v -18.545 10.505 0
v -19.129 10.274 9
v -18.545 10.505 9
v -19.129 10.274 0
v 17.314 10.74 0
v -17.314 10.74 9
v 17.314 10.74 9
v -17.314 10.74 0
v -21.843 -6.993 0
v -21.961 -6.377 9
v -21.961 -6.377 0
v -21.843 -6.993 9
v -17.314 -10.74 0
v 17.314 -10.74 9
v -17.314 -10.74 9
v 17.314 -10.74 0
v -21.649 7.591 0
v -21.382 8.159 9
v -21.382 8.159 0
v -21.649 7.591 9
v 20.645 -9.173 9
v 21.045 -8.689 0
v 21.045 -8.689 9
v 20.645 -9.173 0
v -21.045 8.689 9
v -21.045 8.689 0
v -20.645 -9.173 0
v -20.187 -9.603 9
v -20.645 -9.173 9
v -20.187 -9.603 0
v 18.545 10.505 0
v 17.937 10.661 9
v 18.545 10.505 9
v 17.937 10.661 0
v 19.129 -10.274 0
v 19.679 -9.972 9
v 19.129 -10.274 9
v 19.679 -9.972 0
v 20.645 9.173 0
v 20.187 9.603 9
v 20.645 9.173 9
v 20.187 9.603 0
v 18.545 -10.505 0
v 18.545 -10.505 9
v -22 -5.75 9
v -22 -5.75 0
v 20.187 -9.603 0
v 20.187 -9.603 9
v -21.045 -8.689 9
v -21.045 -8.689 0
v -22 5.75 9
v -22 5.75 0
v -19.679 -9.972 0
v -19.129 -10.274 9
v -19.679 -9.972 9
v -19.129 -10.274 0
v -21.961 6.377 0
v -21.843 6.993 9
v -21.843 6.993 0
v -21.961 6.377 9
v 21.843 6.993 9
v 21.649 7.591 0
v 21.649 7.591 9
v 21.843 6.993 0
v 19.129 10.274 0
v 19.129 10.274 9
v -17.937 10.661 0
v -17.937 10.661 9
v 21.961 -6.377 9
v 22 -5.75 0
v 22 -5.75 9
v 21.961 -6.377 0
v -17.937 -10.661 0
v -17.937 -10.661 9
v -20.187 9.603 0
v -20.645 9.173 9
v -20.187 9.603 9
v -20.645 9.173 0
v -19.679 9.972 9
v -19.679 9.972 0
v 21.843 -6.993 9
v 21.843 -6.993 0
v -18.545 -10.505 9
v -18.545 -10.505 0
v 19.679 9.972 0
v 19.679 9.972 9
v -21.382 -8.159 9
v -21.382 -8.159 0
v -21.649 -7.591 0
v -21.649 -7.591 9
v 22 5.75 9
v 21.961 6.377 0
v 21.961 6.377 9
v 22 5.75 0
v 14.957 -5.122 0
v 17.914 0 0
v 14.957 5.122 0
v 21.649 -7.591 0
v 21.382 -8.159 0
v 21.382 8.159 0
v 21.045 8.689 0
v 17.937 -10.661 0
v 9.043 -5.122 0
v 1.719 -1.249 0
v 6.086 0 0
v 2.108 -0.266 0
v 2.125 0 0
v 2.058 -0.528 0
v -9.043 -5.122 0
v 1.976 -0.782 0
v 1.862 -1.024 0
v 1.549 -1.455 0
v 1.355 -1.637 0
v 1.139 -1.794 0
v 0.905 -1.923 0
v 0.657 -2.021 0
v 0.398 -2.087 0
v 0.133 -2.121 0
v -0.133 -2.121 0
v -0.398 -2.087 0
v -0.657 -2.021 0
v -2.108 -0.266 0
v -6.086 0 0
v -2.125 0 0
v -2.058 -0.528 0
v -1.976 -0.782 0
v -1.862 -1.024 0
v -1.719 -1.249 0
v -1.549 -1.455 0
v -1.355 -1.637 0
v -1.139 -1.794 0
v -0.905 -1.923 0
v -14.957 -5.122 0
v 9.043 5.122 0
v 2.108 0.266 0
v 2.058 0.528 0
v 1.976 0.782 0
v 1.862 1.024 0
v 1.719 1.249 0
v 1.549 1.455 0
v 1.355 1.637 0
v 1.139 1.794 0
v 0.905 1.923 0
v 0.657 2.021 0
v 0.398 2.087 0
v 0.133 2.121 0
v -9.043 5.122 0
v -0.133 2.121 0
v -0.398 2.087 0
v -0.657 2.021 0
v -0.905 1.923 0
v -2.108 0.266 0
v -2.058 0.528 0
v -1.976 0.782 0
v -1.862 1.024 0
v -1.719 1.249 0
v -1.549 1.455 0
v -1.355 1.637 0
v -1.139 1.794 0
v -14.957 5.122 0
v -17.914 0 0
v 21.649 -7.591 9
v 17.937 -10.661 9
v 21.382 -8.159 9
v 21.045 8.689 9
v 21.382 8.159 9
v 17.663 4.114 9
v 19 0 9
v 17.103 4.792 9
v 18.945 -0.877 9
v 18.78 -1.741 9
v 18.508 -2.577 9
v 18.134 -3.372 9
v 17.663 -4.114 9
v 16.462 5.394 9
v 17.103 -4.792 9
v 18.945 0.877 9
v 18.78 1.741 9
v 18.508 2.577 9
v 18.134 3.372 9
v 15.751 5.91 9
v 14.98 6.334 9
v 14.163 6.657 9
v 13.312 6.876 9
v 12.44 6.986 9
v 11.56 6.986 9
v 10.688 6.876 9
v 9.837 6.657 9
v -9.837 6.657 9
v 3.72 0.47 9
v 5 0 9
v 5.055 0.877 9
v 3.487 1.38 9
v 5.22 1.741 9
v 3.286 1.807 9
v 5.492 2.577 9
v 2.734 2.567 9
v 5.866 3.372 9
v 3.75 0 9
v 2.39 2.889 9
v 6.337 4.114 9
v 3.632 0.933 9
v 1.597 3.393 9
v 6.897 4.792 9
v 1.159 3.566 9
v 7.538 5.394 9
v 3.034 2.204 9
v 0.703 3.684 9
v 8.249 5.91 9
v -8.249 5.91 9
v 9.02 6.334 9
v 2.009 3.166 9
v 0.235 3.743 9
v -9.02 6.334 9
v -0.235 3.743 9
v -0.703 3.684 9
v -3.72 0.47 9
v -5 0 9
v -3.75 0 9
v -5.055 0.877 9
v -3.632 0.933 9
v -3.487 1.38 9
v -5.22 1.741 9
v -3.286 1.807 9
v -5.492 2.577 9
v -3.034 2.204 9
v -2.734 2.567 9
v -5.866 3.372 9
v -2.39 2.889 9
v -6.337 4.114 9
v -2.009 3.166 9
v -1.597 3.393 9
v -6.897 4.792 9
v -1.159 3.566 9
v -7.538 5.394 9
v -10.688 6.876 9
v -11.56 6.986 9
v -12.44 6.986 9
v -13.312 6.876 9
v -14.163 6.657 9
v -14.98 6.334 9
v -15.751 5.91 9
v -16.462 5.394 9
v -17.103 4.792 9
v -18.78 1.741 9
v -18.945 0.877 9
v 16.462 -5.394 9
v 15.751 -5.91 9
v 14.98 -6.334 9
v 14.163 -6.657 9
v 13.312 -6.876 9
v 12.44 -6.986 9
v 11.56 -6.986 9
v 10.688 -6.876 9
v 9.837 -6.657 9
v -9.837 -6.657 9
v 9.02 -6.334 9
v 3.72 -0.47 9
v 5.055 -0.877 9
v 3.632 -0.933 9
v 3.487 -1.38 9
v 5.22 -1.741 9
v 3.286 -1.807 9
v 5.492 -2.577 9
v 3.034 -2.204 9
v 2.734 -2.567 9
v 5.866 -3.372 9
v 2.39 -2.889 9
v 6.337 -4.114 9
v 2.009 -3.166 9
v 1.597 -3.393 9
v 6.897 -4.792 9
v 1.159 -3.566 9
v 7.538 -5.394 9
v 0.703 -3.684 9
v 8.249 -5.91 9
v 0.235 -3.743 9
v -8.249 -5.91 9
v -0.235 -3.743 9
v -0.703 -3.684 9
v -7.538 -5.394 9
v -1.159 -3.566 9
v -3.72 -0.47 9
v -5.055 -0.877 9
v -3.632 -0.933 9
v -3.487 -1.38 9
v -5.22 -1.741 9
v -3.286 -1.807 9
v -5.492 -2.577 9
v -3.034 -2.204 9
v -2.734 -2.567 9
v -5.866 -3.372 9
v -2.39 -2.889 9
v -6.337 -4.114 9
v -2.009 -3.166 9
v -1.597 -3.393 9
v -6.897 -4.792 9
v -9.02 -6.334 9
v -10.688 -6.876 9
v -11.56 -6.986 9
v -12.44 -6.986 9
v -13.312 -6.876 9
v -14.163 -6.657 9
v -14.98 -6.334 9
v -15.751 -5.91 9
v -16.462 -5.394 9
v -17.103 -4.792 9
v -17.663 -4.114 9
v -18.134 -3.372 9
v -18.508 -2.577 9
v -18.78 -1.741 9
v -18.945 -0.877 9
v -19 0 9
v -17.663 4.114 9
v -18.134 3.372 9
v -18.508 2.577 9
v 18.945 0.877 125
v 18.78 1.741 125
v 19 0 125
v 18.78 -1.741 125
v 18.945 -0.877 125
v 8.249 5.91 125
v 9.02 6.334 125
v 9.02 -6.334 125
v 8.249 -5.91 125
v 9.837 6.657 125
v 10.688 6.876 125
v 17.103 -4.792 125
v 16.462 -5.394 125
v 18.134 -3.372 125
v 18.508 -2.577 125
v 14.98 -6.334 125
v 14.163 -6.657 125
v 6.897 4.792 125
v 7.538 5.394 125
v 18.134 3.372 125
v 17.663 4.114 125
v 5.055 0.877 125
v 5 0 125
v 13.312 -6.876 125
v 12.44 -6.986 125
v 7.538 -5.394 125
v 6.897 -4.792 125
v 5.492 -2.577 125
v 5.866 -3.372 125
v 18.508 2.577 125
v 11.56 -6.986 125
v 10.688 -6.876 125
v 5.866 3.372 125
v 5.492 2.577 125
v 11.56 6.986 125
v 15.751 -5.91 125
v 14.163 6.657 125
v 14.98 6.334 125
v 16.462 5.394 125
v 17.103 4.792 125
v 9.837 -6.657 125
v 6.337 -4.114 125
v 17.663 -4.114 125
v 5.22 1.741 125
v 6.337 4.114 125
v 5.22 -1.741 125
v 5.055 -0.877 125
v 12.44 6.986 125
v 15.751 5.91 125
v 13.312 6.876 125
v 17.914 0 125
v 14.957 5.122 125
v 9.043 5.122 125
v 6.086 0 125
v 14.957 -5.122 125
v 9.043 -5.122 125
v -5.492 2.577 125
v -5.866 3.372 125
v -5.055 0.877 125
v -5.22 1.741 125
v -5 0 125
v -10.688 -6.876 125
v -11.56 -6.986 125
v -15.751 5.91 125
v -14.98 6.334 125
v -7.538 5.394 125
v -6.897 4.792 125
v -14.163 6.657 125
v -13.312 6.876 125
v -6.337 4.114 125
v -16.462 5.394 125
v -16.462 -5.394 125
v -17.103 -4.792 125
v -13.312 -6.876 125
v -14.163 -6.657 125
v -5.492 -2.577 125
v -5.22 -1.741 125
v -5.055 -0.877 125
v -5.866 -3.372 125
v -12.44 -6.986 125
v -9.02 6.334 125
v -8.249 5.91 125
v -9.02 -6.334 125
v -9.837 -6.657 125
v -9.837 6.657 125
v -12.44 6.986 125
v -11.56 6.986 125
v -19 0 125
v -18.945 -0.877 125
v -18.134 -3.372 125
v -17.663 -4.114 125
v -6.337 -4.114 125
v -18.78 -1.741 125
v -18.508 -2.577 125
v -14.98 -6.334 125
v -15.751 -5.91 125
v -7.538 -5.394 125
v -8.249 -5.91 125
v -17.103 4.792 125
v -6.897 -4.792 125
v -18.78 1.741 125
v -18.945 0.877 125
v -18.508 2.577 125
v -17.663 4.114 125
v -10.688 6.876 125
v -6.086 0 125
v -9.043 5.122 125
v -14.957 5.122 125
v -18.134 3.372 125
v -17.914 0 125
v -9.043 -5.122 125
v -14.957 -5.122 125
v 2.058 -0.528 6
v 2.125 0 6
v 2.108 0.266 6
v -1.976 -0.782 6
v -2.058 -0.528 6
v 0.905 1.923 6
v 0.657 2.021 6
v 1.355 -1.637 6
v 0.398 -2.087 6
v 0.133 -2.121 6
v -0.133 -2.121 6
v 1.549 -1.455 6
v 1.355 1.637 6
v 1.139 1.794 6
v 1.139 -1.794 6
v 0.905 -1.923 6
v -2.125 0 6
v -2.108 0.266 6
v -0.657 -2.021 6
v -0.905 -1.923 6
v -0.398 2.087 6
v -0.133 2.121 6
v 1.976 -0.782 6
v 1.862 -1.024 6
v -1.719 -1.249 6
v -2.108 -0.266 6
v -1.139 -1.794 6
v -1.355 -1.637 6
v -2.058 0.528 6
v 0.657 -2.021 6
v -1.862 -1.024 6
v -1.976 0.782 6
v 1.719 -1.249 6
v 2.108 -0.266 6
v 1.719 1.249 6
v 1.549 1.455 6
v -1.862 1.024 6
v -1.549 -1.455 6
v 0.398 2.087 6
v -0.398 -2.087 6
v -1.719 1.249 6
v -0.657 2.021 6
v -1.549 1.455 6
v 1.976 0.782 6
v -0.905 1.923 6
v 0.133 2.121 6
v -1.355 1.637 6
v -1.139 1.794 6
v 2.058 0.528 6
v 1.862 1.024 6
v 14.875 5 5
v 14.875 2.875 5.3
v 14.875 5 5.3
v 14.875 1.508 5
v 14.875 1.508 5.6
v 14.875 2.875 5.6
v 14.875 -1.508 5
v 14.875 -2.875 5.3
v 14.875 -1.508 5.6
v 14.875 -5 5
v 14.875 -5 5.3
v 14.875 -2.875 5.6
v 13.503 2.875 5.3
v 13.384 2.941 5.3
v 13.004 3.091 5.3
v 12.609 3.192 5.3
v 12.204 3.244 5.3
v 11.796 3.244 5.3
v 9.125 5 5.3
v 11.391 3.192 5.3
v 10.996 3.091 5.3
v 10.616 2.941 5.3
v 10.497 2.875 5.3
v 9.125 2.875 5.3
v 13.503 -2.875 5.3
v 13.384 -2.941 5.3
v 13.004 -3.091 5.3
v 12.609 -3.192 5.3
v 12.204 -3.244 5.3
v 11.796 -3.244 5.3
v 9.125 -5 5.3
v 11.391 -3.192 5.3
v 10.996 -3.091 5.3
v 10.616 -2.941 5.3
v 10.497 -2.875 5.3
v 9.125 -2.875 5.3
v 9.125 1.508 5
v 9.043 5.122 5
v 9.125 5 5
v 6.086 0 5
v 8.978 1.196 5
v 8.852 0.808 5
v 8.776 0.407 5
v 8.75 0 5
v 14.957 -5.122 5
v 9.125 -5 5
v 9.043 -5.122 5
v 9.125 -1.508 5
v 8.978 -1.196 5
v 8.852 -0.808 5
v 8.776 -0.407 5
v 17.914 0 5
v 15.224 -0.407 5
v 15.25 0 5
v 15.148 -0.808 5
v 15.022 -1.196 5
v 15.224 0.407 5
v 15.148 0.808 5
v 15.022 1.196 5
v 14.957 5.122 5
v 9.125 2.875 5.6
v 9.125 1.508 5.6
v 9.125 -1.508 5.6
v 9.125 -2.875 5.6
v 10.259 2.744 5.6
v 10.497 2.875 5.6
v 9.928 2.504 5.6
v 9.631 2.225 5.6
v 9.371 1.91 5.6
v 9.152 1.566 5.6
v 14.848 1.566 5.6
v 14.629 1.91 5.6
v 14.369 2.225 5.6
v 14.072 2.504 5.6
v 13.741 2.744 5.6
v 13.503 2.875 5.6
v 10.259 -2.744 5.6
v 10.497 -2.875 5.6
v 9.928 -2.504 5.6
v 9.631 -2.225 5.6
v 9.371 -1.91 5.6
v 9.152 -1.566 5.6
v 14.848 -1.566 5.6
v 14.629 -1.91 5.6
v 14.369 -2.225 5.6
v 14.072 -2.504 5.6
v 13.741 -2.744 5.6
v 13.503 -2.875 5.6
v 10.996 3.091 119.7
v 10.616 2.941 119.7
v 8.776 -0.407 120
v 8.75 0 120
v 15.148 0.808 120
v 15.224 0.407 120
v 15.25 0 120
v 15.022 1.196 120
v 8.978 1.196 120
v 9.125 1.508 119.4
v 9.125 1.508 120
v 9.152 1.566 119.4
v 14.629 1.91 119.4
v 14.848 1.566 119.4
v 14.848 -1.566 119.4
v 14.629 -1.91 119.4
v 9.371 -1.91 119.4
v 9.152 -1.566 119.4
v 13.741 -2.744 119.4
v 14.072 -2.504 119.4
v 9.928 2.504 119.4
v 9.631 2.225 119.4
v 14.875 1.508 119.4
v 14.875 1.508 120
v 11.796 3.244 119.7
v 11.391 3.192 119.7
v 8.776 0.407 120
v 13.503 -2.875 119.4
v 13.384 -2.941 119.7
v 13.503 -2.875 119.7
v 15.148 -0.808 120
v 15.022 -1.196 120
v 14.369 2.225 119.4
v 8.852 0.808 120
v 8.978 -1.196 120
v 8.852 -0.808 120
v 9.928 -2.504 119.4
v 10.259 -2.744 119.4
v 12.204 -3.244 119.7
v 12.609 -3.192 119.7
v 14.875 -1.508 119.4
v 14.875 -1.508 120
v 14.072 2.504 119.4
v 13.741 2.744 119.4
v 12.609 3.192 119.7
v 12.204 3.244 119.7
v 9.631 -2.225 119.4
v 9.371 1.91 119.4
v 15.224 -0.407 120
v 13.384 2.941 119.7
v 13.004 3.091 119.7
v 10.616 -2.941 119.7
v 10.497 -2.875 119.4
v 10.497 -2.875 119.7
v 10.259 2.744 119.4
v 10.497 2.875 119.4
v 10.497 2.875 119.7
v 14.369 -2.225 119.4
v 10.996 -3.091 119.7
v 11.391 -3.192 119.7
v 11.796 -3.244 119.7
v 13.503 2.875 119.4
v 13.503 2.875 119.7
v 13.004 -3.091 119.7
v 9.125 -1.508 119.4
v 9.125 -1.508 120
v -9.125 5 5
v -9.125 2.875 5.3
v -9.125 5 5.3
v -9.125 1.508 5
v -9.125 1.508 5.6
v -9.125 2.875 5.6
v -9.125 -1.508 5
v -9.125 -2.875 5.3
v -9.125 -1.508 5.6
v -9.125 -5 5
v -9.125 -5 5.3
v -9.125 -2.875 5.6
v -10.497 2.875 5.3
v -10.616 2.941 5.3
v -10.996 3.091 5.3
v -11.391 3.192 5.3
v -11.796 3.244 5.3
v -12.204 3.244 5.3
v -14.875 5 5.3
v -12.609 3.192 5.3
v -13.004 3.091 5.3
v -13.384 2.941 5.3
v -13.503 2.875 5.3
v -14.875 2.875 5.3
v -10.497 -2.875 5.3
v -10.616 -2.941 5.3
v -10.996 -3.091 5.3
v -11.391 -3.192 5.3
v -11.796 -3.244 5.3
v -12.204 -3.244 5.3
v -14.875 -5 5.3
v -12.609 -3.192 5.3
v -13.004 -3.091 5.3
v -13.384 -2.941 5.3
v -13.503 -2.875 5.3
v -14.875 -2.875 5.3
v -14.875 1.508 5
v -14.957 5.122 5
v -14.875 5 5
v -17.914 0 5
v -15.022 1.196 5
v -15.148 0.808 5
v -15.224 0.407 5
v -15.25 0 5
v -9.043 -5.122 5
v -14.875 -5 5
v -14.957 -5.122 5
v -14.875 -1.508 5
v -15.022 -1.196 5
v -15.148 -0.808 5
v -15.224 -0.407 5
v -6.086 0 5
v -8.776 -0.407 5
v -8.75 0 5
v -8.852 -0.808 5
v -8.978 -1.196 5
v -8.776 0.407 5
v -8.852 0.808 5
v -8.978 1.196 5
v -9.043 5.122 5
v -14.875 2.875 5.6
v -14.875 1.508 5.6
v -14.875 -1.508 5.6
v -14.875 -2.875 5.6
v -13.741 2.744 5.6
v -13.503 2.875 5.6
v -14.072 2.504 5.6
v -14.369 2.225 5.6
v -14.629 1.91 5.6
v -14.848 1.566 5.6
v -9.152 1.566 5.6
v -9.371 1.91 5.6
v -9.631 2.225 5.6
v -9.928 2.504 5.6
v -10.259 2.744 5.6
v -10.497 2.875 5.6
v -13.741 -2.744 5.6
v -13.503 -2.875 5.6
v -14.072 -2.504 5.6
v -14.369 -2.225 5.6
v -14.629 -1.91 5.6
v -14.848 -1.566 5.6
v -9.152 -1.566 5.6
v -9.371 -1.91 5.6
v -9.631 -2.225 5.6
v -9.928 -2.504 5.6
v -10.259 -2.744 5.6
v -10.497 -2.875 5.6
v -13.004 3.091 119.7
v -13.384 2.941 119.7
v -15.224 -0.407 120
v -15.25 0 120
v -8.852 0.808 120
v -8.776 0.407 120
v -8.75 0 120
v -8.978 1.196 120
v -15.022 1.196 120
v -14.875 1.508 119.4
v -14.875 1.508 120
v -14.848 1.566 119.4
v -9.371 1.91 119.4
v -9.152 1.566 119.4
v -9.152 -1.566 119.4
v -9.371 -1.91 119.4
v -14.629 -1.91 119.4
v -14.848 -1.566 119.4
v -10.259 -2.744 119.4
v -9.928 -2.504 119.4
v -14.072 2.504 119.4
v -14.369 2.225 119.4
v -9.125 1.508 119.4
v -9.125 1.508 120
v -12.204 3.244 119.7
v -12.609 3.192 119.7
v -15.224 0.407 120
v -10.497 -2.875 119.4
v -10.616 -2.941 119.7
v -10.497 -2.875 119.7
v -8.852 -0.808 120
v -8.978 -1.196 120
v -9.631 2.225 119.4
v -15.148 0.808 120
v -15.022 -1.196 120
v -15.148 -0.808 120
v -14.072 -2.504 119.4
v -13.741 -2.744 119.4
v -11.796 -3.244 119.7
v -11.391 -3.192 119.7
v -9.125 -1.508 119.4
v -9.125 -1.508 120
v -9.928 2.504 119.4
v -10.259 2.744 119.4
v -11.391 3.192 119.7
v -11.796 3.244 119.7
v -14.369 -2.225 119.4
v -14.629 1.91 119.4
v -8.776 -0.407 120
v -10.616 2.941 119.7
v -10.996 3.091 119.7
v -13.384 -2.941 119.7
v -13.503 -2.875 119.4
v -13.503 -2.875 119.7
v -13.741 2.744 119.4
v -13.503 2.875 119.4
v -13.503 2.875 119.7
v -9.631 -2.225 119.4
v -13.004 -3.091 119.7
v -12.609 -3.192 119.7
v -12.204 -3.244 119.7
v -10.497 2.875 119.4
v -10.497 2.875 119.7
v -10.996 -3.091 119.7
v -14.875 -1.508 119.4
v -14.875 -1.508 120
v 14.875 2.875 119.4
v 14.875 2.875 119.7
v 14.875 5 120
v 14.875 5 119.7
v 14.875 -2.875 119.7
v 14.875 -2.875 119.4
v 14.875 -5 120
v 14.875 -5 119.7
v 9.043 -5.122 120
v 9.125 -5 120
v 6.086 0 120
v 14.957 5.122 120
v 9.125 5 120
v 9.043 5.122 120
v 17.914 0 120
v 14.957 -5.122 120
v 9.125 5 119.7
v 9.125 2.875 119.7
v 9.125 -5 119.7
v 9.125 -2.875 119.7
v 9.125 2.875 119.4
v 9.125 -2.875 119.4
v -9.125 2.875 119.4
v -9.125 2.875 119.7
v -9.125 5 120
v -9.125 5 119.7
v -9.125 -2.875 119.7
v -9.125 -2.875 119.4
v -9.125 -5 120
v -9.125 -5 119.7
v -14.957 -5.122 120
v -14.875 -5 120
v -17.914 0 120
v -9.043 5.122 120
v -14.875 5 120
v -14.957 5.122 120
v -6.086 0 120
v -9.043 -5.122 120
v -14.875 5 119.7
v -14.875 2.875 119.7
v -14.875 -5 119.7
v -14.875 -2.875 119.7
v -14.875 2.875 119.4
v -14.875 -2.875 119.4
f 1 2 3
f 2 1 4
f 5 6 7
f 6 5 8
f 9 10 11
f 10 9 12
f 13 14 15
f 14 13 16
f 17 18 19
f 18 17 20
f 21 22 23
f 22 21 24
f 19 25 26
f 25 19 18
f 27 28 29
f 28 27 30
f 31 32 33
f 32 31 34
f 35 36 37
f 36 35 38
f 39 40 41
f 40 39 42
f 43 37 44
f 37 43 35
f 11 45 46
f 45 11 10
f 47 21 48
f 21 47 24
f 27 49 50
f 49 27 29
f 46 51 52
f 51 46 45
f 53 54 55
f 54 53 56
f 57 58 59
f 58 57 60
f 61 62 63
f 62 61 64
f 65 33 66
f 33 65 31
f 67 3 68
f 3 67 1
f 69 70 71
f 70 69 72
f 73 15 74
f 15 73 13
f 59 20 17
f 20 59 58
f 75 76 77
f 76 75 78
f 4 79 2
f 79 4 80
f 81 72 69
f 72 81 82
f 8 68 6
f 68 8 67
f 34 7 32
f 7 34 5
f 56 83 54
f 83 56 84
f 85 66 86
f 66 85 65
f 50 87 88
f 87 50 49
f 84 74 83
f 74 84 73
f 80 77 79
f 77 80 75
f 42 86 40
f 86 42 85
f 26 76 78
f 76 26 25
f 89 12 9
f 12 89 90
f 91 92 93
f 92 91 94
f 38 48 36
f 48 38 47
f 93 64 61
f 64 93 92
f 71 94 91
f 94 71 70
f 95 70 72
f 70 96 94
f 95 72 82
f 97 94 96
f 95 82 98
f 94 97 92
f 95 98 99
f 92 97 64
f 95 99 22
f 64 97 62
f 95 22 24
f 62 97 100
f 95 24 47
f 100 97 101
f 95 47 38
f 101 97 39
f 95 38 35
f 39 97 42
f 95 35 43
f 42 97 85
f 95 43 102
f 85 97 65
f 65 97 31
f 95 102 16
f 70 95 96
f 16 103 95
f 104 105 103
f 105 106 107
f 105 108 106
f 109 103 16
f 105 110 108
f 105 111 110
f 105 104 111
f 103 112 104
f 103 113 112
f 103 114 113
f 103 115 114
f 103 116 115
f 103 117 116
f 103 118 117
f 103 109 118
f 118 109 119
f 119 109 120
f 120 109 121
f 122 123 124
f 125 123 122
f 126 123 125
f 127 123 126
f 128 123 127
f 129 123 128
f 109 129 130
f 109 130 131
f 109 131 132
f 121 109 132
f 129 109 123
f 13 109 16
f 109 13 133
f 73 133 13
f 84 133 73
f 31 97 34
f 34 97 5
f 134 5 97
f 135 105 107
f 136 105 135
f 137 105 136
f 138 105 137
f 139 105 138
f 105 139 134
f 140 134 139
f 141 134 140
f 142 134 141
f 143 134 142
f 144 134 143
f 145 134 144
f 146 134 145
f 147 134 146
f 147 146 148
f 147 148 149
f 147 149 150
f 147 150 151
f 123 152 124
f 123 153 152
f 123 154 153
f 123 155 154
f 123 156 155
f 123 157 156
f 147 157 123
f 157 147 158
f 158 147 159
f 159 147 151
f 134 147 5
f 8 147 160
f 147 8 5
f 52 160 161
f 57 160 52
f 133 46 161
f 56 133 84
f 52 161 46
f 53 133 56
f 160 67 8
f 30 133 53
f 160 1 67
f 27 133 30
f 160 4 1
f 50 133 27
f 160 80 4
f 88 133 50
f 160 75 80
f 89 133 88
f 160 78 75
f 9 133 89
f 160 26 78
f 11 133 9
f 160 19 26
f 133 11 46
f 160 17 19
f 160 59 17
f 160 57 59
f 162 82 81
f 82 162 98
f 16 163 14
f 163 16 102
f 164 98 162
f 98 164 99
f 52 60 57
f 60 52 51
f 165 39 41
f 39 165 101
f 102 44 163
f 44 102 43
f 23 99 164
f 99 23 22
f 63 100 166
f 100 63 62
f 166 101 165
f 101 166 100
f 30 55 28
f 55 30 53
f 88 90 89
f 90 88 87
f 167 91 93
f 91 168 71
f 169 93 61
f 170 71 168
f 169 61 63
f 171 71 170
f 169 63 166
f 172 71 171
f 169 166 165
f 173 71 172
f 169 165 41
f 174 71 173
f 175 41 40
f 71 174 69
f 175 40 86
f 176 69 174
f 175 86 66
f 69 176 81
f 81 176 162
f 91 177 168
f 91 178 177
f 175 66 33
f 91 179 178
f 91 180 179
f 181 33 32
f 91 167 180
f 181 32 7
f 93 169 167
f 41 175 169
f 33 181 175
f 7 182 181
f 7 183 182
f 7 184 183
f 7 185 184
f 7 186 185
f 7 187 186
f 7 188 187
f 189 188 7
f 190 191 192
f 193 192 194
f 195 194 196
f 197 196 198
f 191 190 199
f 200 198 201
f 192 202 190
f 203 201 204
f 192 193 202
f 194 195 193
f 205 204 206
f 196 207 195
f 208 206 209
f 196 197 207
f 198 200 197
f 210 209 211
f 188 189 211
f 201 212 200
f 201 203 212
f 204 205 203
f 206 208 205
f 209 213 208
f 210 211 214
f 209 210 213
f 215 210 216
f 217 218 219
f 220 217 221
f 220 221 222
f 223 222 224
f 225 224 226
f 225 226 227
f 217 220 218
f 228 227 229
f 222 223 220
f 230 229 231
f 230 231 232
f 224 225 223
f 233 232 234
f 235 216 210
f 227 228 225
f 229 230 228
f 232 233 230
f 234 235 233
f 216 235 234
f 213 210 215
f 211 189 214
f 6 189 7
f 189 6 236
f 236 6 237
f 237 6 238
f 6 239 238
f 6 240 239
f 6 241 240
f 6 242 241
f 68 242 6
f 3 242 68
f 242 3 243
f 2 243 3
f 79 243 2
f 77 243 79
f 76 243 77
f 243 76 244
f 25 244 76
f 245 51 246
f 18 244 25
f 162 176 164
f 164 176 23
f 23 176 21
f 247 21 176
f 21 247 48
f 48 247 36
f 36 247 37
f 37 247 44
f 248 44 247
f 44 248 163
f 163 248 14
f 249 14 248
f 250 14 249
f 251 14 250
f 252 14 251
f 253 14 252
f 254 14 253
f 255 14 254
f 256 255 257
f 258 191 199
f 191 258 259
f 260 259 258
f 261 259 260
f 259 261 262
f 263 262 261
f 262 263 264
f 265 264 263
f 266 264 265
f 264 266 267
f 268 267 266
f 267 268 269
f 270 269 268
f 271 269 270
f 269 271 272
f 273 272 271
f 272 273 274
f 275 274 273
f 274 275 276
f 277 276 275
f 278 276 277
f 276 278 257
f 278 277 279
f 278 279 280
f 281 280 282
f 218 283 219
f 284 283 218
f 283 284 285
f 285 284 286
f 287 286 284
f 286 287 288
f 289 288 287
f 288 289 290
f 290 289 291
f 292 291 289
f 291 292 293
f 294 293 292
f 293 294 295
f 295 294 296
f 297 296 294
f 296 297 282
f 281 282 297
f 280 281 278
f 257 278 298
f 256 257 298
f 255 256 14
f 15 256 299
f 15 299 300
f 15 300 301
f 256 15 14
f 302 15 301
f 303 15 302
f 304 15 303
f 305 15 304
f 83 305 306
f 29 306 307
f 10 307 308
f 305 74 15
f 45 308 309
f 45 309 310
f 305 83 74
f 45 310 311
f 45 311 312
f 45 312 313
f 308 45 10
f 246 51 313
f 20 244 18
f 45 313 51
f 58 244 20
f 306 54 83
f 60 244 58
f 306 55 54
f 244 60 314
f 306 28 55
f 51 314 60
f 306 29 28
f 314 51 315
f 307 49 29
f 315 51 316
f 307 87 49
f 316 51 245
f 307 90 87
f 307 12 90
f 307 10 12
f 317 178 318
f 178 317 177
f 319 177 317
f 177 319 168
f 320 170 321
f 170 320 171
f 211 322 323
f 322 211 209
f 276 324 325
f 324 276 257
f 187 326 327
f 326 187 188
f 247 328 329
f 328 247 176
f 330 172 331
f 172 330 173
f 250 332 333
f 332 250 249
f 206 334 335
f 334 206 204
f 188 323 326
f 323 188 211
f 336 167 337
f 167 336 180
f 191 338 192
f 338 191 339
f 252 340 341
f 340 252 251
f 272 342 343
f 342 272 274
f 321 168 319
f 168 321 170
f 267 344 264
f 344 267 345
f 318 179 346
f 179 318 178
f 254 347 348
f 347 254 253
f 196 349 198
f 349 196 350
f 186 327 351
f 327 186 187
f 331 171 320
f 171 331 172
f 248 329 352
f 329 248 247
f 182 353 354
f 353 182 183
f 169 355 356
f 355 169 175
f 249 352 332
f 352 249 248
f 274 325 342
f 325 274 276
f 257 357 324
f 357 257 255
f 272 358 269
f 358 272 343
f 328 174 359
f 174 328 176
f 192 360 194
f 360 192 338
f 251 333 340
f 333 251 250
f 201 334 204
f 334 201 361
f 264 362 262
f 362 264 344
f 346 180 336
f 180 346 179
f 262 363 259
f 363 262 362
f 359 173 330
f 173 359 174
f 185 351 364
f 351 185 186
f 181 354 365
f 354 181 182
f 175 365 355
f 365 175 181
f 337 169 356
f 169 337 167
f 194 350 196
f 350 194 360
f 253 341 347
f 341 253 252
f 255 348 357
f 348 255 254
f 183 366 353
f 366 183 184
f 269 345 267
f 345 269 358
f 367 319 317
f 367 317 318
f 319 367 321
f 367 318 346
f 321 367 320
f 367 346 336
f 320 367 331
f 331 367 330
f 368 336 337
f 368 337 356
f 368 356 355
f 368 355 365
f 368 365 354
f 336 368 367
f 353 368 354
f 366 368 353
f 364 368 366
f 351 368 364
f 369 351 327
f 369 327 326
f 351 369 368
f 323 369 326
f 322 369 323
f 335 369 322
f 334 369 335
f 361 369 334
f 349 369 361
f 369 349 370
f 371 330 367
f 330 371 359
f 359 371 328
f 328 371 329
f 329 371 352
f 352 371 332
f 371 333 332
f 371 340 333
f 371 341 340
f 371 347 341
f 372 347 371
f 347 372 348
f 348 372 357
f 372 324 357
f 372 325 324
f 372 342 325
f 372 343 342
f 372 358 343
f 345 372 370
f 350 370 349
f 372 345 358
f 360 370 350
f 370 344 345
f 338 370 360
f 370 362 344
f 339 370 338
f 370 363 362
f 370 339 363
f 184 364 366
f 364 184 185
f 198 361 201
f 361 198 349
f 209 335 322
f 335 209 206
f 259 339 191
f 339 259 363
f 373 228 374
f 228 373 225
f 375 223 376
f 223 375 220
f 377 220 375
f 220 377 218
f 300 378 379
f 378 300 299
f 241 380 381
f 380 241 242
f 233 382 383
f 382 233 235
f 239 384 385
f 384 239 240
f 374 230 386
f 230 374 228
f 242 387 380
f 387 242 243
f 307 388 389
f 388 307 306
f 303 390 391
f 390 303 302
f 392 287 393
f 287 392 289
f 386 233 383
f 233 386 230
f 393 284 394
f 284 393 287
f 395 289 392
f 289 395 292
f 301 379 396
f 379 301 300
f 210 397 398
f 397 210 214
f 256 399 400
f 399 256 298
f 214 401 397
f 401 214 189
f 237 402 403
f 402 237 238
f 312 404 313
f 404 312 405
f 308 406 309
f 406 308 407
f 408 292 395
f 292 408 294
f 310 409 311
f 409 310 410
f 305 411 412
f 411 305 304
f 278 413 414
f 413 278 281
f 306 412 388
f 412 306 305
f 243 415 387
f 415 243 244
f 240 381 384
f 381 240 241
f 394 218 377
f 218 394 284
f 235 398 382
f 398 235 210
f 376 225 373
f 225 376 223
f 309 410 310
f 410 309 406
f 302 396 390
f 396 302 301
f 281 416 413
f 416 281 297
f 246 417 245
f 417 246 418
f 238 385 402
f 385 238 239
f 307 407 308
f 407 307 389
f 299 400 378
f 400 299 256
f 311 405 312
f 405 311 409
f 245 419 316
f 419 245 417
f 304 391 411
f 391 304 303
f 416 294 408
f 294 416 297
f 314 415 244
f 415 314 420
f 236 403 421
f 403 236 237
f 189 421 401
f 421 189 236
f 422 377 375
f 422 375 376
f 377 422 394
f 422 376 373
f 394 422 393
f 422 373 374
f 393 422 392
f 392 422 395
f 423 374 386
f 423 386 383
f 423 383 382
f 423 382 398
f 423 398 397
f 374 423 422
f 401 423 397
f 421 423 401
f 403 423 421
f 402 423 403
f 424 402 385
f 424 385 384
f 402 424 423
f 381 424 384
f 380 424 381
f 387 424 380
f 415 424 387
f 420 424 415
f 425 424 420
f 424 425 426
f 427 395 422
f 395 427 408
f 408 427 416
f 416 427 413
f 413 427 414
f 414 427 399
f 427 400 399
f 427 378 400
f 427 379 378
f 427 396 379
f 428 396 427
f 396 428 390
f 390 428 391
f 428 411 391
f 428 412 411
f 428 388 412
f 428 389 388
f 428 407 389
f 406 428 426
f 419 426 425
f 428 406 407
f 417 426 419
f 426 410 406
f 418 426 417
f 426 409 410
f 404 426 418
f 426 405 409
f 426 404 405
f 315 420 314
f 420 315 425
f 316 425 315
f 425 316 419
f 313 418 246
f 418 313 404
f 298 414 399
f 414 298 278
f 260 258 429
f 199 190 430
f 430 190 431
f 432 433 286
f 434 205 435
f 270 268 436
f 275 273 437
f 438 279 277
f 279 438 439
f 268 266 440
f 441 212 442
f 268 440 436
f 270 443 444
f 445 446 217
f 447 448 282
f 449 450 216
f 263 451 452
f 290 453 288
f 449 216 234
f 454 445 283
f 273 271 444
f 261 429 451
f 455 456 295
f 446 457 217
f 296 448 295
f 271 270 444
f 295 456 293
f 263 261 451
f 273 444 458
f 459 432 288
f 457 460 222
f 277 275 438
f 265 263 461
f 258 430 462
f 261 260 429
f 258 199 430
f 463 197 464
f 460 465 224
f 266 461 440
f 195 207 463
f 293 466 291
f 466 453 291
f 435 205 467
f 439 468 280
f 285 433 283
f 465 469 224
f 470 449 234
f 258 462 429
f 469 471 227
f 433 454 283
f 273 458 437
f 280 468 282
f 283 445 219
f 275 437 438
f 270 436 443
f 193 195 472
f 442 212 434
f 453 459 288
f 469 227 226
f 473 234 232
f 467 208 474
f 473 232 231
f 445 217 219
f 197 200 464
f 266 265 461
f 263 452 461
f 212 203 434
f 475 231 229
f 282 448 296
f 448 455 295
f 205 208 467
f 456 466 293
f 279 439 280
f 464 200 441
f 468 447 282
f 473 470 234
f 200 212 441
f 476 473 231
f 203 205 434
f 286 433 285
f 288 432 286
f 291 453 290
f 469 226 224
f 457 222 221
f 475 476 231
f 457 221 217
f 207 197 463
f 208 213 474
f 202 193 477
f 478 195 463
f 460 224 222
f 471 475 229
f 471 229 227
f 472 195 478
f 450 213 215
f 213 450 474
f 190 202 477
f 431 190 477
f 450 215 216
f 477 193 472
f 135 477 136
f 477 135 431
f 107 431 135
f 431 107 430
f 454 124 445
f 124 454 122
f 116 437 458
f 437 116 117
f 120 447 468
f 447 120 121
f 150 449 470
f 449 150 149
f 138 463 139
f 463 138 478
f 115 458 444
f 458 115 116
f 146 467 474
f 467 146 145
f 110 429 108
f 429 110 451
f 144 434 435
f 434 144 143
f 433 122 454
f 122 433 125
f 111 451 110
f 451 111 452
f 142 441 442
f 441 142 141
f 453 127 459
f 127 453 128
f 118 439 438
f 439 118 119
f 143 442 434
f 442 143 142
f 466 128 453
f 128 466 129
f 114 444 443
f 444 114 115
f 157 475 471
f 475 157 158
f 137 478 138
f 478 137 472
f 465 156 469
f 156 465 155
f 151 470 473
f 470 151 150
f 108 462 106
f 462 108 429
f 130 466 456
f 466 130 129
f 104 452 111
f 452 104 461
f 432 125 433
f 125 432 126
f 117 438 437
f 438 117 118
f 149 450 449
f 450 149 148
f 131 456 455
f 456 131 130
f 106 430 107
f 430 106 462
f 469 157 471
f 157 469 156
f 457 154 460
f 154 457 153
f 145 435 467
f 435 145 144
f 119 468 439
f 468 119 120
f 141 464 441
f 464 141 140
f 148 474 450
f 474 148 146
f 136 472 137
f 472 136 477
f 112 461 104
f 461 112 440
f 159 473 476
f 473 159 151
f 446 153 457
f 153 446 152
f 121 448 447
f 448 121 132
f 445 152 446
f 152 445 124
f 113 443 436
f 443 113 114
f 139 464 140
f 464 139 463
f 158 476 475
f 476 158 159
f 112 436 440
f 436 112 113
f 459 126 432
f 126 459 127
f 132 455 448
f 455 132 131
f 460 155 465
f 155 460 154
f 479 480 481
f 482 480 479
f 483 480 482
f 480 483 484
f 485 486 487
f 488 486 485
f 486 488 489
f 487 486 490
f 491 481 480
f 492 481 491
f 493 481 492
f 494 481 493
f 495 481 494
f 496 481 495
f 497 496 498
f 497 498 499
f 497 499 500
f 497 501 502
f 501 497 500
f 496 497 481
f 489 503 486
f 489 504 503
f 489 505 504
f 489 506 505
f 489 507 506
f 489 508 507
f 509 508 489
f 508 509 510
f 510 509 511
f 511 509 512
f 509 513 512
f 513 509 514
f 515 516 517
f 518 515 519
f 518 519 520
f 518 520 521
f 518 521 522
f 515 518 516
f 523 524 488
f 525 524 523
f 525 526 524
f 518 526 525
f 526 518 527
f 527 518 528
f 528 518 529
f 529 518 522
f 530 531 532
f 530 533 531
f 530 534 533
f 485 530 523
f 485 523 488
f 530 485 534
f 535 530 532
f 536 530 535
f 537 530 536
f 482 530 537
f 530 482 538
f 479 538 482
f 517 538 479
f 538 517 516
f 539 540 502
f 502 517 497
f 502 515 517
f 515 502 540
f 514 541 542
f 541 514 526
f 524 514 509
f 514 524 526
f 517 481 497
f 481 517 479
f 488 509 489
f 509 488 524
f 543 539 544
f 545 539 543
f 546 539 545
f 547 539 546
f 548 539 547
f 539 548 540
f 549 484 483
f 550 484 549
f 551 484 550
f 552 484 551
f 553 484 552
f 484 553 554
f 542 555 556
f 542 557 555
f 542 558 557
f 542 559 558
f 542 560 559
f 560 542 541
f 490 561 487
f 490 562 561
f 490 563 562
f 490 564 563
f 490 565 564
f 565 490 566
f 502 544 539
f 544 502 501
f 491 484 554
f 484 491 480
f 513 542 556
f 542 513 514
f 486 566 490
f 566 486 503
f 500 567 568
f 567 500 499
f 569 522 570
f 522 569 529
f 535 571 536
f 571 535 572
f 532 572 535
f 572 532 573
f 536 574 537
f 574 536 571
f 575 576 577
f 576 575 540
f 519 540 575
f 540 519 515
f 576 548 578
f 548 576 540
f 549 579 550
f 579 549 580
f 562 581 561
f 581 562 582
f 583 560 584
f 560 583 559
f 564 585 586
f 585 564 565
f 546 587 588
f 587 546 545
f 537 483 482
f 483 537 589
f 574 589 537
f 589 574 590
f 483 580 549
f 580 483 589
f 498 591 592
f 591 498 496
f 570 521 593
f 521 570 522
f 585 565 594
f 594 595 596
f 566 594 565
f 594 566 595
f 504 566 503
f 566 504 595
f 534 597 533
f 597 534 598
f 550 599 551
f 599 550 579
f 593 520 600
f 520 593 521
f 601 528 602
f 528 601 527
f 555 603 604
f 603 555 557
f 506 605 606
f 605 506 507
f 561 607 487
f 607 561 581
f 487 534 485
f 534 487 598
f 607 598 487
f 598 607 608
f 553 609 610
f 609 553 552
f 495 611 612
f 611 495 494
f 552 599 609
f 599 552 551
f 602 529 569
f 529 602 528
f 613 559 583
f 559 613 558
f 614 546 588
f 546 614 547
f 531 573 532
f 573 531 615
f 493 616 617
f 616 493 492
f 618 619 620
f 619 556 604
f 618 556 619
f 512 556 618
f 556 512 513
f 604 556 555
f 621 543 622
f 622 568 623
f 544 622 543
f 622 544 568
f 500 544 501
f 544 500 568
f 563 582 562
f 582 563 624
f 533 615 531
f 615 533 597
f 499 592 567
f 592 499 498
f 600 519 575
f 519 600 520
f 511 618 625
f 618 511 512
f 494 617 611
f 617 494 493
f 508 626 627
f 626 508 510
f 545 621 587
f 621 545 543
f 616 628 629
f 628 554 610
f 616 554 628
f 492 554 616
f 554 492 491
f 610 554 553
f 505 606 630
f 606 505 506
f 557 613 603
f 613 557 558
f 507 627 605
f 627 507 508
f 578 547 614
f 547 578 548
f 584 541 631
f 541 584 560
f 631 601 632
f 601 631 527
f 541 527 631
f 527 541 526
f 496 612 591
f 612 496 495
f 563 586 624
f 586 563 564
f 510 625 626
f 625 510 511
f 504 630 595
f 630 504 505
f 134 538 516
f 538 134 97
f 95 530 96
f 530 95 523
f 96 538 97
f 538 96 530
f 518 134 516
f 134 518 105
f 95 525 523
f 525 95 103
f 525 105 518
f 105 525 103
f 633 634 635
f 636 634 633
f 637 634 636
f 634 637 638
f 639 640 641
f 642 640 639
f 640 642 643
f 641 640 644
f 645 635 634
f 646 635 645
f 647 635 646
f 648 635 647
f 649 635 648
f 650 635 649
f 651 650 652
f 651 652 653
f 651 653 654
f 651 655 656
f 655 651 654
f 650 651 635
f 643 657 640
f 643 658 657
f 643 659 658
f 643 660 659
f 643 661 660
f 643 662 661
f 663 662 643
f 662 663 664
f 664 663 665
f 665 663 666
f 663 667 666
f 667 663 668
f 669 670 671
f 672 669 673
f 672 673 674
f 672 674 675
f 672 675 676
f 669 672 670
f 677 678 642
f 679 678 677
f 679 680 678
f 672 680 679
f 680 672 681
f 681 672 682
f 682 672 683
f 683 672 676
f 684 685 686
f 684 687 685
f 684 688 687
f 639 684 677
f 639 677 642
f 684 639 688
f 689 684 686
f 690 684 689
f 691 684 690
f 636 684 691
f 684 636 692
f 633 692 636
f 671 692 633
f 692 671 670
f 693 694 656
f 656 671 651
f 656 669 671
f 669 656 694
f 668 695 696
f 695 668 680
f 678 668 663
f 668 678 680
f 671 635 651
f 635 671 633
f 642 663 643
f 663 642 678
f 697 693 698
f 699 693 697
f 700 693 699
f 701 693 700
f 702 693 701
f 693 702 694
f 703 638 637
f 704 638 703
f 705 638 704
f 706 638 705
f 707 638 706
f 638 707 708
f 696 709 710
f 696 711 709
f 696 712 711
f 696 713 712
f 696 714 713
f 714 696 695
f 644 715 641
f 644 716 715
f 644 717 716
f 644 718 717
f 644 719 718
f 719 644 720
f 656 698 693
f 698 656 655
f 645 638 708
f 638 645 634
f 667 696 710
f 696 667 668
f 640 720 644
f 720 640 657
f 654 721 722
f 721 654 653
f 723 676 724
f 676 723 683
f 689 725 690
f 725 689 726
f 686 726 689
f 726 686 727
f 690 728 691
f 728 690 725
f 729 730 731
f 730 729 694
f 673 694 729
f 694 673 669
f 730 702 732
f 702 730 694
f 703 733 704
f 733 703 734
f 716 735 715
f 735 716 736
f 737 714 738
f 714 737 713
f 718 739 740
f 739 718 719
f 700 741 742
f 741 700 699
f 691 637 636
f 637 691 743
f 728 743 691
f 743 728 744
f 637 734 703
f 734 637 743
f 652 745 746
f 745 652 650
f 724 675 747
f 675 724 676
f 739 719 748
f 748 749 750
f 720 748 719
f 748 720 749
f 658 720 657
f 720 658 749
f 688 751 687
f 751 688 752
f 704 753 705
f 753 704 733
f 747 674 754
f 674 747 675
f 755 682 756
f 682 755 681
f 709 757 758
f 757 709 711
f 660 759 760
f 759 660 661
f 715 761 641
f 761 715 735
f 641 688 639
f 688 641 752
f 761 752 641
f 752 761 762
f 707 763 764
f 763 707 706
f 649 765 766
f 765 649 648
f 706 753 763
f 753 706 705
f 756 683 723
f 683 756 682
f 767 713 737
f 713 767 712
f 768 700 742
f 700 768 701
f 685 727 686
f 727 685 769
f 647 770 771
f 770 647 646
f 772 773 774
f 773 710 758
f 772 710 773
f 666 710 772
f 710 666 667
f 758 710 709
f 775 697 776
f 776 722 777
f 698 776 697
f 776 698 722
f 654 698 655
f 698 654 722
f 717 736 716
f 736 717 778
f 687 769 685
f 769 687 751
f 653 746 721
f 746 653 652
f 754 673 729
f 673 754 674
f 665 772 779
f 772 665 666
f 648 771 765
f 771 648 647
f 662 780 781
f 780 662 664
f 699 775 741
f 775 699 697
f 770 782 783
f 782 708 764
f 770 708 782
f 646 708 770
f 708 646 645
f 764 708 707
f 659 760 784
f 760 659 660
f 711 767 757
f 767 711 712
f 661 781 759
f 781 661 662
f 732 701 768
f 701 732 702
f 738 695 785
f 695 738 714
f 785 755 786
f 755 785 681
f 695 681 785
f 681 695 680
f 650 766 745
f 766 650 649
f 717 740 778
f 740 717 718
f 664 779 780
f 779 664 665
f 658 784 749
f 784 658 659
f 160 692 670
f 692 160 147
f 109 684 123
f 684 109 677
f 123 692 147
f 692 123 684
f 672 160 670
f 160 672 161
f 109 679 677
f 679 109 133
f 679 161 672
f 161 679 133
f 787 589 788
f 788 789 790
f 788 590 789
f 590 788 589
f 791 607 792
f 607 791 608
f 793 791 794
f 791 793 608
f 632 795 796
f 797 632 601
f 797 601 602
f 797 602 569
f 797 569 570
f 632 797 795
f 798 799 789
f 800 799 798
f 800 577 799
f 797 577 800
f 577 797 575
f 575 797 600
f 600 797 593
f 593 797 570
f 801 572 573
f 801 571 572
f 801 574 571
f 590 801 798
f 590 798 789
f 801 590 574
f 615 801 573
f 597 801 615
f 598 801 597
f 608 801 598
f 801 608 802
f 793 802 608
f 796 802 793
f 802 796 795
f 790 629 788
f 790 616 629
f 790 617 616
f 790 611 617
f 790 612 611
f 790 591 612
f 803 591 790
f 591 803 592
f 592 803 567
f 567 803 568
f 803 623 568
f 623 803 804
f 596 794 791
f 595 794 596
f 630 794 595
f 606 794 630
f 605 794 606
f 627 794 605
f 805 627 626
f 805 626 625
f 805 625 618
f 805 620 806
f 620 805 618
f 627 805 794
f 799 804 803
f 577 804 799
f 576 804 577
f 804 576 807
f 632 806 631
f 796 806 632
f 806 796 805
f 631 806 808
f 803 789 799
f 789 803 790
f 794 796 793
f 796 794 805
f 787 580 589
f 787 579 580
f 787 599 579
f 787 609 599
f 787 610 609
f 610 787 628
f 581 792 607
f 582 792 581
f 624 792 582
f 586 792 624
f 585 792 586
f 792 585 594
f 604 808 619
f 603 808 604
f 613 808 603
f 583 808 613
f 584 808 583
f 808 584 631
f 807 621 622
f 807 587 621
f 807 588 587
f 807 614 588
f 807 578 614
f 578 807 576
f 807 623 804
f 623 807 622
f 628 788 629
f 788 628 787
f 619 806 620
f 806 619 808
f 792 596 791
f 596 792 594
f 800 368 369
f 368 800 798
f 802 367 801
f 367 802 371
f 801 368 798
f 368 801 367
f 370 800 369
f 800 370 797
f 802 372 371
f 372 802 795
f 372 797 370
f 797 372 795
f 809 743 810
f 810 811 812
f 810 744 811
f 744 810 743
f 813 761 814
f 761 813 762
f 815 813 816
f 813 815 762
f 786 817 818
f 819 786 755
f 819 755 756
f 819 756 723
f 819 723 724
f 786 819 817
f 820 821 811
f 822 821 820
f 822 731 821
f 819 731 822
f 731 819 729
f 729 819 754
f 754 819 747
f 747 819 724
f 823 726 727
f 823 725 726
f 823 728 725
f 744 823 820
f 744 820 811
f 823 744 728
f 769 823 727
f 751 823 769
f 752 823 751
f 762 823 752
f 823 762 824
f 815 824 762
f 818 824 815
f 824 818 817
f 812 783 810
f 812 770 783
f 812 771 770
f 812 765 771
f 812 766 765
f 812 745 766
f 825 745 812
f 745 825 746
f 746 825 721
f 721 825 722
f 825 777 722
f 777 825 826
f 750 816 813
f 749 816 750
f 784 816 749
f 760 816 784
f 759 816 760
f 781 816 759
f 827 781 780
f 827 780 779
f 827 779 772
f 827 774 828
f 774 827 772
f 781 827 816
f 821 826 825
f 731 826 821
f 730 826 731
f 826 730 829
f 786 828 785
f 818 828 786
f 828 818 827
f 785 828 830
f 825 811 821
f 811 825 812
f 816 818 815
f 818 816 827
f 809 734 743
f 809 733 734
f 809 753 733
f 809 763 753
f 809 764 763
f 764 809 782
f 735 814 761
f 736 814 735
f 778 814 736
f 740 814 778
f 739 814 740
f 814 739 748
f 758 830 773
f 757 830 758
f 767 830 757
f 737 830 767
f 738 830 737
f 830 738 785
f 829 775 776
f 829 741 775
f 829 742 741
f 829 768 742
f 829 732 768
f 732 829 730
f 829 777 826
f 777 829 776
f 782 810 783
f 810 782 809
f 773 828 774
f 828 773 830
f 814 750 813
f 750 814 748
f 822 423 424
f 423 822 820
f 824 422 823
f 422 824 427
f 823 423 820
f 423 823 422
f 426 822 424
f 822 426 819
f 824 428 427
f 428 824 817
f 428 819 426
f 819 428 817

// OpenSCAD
$fn = 50;


difference() {
	union() {
		hull() {
			translate(v = [-17.0000000000, 5.7500000000, 0]) {
				cylinder(h = 9, r = 5);
			}
			translate(v = [17.0000000000, 5.7500000000, 0]) {
				cylinder(h = 9, r = 5);
			}
			translate(v = [-17.0000000000, -5.7500000000, 0]) {
				cylinder(h = 9, r = 5);
			}
			translate(v = [17.0000000000, -5.7500000000, 0]) {
				cylinder(h = 9, r = 5);
			}
		}
		translate(v = [12.0000000000, 0, 0.0000000000]) {
			cylinder(h = 125, r = 7.0000000000);
		}
		translate(v = [-12.0000000000, 0, 0.0000000000]) {
			cylinder(h = 125, r = 7.0000000000);
		}
	}
	union() {
		translate(v = [0, 0, 9]) {
			rotate(a = [0, 0, 0]) {
				difference() {
					union() {
						#translate(v = [0, 0, -120.0000000000]) {
							cylinder(h = 120, r = 2.0000000000);
						}
						#translate(v = [0, 0, -3]) {
							cylinder(h = 3, r1 = 2.1250000000, r2 = 3.7500000000);
						}
						#translate(v = [0, 0, -120.0000000000]) {
							cylinder(h = 120, r = 2.1250000000);
						}
						#translate(v = [0, 0, -120.0000000000]) {
							cylinder(h = 120, r = 2.0000000000);
						}
					}
					union();
				}
			}
		}
		translate(v = [12.0000000000, 0, 0]) {
			rotate(a = [0, 0, 0]) {
				difference() {
					union() {
						#translate(v = [-2.8750000000, -5.0000000000, -0.3000000000]) {
							cube(size = [5.7500000000, 10, 0.3000000000]);
						}
						#translate(v = [-2.8750000000, -2.8750000000, -0.6000000000]) {
							cube(size = [5.7500000000, 5.7500000000, 0.3000000000]);
						}
						#translate(v = [-2.8750000000, -5.0000000000, 5]) {
							cube(size = [5.7500000000, 10, 0.3000000000]);
						}
						#translate(v = [-2.8750000000, -2.8750000000, 5.3000000000]) {
							cube(size = [5.7500000000, 5.7500000000, 0.3000000000]);
						}
						#translate(v = [0, 0, -100.0000000000]) {
							cylinder(h = 200, r = 3.2500000000);
						}
						#linear_extrude(height = 5) {
							polygon(points = [[5.9142500000, 0.0000000000], [2.9571250000, 5.1218907443], [-2.9571250000, 5.1218907443], [-5.9142500000, 0.0000000000], [-2.9571250000, -5.1218907443], [2.9571250000, -5.1218907443]]);
						}
						#translate(v = [-2.8750000000, -5.0000000000, -0.3000000000]) {
							cube(size = [5.7500000000, 10, 0.3000000000]);
						}
						#translate(v = [-2.8750000000, -2.8750000000, -0.6000000000]) {
							cube(size = [5.7500000000, 5.7500000000, 0.3000000000]);
						}
						#translate(v = [-2.8750000000, -5.0000000000, 5]) {
							cube(size = [5.7500000000, 10, 0.3000000000]);
						}
						#translate(v = [-2.8750000000, -2.8750000000, 5.3000000000]) {
							cube(size = [5.7500000000, 5.7500000000, 0.3000000000]);
						}
						#translate(v = [0, 0, -100.0000000000]) {
							cylinder(h = 200, r = 3.2500000000);
						}
						#translate(v = [-2.8750000000, -5.0000000000, -0.3000000000]) {
							cube(size = [5.7500000000, 10, 0.3000000000]);
						}
						#translate(v = [-2.8750000000, -2.8750000000, -0.6000000000]) {
							cube(size = [5.7500000000, 5.7500000000, 0.3000000000]);
						}
						#translate(v = [-2.8750000000, -5.0000000000, 5]) {
							cube(size = [5.7500000000, 10, 0.3000000000]);
						}
						#translate(v = [-2.8750000000, -2.8750000000, 5.3000000000]) {
							cube(size = [5.7500000000, 5.7500000000, 0.3000000000]);
						}
						#translate(v = [0, 0, -100.0000000000]) {
							cylinder(h = 200, r = 3.2500000000);
						}
					}
					union();
				}
			}
		}
		translate(v = [-12.0000000000, 0, 0]) {
			rotate(a = [0, 0, 0]) {
				difference() {
					union() {
						#translate(v = [-2.8750000000, -5.0000000000, -0.3000000000]) {
							cube(size = [5.7500000000, 10, 0.3000000000]);
						}
						#translate(v = [-2.8750000000, -2.8750000000, -0.6000000000]) {
							cube(size = [5.7500000000, 5.7500000000, 0.3000000000]);
						}
						#translate(v = [-2.8750000000, -5.0000000000, 5]) {
							cube(size = [5.7500000000, 10, 0.3000000000]);
						}
						#translate(v = [-2.8750000000, -2.8750000000, 5.3000000000]) {
							cube(size = [5.7500000000, 5.7500000000, 0.3000000000]);
						}
						#translate(v = [0, 0, -100.0000000000]) {
							cylinder(h = 200, r = 3.2500000000);
						}
						#linear_extrude(height = 5) {
							polygon(points = [[5.9142500000, 0.0000000000], [2.9571250000, 5.1218907443], [-2.9571250000, 5.1218907443], [-5.9142500000, 0.0000000000], [-2.9571250000, -5.1218907443], [2.9571250000, -5.1218907443]]);
						}
						#translate(v = [-2.8750000000, -5.0000000000, -0.3000000000]) {
							cube(size = [5.7500000000, 10, 0.3000000000]);
						}
						#translate(v = [-2.8750000000, -2.8750000000, -0.6000000000]) {
							cube(size = [5.7500000000, 5.7500000000, 0.3000000000]);
						}
						#translate(v = [-2.8750000000, -5.0000000000, 5]) {
							cube(size = [5.7500000000, 10, 0.3000000000]);
						}
						#translate(v = [-2.8750000000, -2.8750000000, 5.3000000000]) {
							cube(size = [5.7500000000, 5.7500000000, 0.3000000000]);
						}
						#translate(v = [0, 0, -100.0000000000]) {
							cylinder(h = 200, r = 3.2500000000);
						}
						#translate(v = [-2.8750000000, -5.0000000000, -0.3000000000]) {
							cube(size = [5.7500000000, 10, 0.3000000000]);
						}
						#translate(v = [-2.8750000000, -2.8750000000, -0.6000000000]) {
							cube(size = [5.7500000000, 5.7500000000, 0.3000000000]);
						}
						#translate(v = [-2.8750000000, -5.0000000000, 5]) {
							cube(size = [5.7500000000, 10, 0.3000000000]);
						}
						#translate(v = [-2.8750000000, -2.8750000000, 5.3000000000]) {
							cube(size = [5.7500000000, 5.7500000000, 0.3000000000]);
						}
						#translate(v = [0, 0, -100.0000000000]) {
							cylinder(h = 200, r = 3.2500000000);
						}
					}
					union();
				}
			}
		}
		translate(v = [12.0000000000, 0, 125]) {
			rotate(a = [0, 0, 0]) {
				difference() {
					union() {
						#translate(v = [-2.8750000000, -5.0000000000, -5.3000000000]) {
							cube(size = [5.7500000000, 10, 0.3000000000]);
						}
						#translate(v = [-2.8750000000, -2.8750000000, -5.6000000000]) {
							cube(size = [5.7500000000, 5.7500000000, 0.3000000000]);
						}
						#translate(v = [-2.8750000000, -5.0000000000, 0]) {
							cube(size = [5.7500000000, 10, 0.3000000000]);
						}
						#translate(v = [-2.8750000000, -2.8750000000, 0.3000000000]) {
							cube(size = [5.7500000000, 5.7500000000, 0.3000000000]);
						}
						#translate(v = [0, 0, -100.0000000000]) {
							cylinder(h = 200, r = 3.2500000000);
						}
						translate(v = [0, 0, -5]) {
							#linear_extrude(height = 5) {
								polygon(points = [[5.9142500000, 0.0000000000], [2.9571250000, 5.1218907443], [-2.9571250000, 5.1218907443], [-5.9142500000, 0.0000000000], [-2.9571250000, -5.1218907443], [2.9571250000, -5.1218907443]]);
							}
						}
						#translate(v = [-2.8750000000, -5.0000000000, -5.3000000000]) {
							cube(size = [5.7500000000, 10, 0.3000000000]);
						}
						#translate(v = [-2.8750000000, -2.8750000000, -5.6000000000]) {
							cube(size = [5.7500000000, 5.7500000000, 0.3000000000]);
						}
						#translate(v = [-2.8750000000, -5.0000000000, 0]) {
							cube(size = [5.7500000000, 10, 0.3000000000]);
						}
						#translate(v = [-2.8750000000, -2.8750000000, 0.3000000000]) {
							cube(size = [5.7500000000, 5.7500000000, 0.3000000000]);
						}
						#translate(v = [0, 0, -100.0000000000]) {
							cylinder(h = 200, r = 3.2500000000);
						}
						#translate(v = [-2.8750000000, -5.0000000000, -5.3000000000]) {
							cube(size = [5.7500000000, 10, 0.3000000000]);
						}
						#translate(v = [-2.8750000000, -2.8750000000, -5.6000000000]) {
							cube(size = [5.7500000000, 5.7500000000, 0.3000000000]);
						}
						#translate(v = [-2.8750000000, -5.0000000000, 0]) {
							cube(size = [5.7500000000, 10, 0.3000000000]);
						}
						#translate(v = [-2.8750000000, -2.8750000000, 0.3000000000]) {
							cube(size = [5.7500000000, 5.7500000000, 0.3000000000]);
						}
						#translate(v = [0, 0, -100.0000000000]) {
							cylinder(h = 200, r = 3.2500000000);
						}
					}
					union();
				}
			}
		}
		translate(v = [-12.0000000000, 0, 125]) {
			rotate(a = [0, 0, 0]) {
				difference() {
					union() {
						#translate(v = [-2.8750000000, -5.0000000000, -5.3000000000]) {
							cube(size = [5.7500000000, 10, 0.3000000000]);
						}
						#translate(v = [-2.8750000000, -2.8750000000, -5.6000000000]) {
							cube(size = [5.7500000000, 5.7500000000, 0.3000000000]);
						}
						#translate(v = [-2.8750000000, -5.0000000000, 0]) {
							cube(size = [5.7500000000, 10, 0.3000000000]);
						}
						#translate(v = [-2.8750000000, -2.8750000000, 0.3000000000]) {
							cube(size = [5.7500000000, 5.7500000000, 0.3000000000]);
						}
						#translate(v = [0, 0, -100.0000000000]) {
							cylinder(h = 200, r = 3.2500000000);
						}
						translate(v = [0, 0, -5]) {
							#linear_extrude(height = 5) {
								polygon(points = [[5.9142500000, 0.0000000000], [2.9571250000, 5.1218907443], [-2.9571250000, 5.1218907443], [-5.9142500000, 0.0000000000], [-2.9571250000, -5.1218907443], [2.9571250000, -5.1218907443]]);
							}
						}
						#translate(v = [-2.8750000000, -5.0000000000, -5.3000000000]) {
							cube(size = [5.7500000000, 10, 0.3000000000]);
						}
						#translate(v = [-2.8750000000, -2.8750000000, -5.6000000000]) {
							cube(size = [5.7500000000, 5.7500000000, 0.3000000000]);
						}
						#translate(v = [-2.8750000000, -5.0000000000, 0]) {
							cube(size = [5.7500000000, 10, 0.3000000000]);
						}
						#translate(v = [-2.8750000000, -2.8750000000, 0.3000000000]) {
							cube(size = [5.7500000000, 5.7500000000, 0.3000000000]);
						}
						#translate(v = [0, 0, -100.0000000000]) {
							cylinder(h = 200, r = 3.2500000000);
						}
						#translate(v = [-2.8750000000, -5.0000000000, -5.3000000000]) {
							cube(size = [5.7500000000, 10, 0.3000000000]);
						}
						#translate(v = [-2.8750000000, -2.8750000000, -5.6000000000]) {
							cube(size = [5.7500000000, 5.7500000000, 0.3000000000]);
						}
						#translate(v = [-2.8750000000, -5.0000000000, 0]) {
							cube(size = [5.7500000000, 10, 0.3000000000]);
						}
						#translate(v = [-2.8750000000, -2.8750000000, 0.3000000000]) {
							cube(size = [5.7500000000, 5.7500000000, 0.3000000000]);
						}
						#translate(v = [0, 0, -100.0000000000]) {
							cylinder(h = 200, r = 3.2500000000);
						}
					}
					union();
				}
			}
		}
	}
}
